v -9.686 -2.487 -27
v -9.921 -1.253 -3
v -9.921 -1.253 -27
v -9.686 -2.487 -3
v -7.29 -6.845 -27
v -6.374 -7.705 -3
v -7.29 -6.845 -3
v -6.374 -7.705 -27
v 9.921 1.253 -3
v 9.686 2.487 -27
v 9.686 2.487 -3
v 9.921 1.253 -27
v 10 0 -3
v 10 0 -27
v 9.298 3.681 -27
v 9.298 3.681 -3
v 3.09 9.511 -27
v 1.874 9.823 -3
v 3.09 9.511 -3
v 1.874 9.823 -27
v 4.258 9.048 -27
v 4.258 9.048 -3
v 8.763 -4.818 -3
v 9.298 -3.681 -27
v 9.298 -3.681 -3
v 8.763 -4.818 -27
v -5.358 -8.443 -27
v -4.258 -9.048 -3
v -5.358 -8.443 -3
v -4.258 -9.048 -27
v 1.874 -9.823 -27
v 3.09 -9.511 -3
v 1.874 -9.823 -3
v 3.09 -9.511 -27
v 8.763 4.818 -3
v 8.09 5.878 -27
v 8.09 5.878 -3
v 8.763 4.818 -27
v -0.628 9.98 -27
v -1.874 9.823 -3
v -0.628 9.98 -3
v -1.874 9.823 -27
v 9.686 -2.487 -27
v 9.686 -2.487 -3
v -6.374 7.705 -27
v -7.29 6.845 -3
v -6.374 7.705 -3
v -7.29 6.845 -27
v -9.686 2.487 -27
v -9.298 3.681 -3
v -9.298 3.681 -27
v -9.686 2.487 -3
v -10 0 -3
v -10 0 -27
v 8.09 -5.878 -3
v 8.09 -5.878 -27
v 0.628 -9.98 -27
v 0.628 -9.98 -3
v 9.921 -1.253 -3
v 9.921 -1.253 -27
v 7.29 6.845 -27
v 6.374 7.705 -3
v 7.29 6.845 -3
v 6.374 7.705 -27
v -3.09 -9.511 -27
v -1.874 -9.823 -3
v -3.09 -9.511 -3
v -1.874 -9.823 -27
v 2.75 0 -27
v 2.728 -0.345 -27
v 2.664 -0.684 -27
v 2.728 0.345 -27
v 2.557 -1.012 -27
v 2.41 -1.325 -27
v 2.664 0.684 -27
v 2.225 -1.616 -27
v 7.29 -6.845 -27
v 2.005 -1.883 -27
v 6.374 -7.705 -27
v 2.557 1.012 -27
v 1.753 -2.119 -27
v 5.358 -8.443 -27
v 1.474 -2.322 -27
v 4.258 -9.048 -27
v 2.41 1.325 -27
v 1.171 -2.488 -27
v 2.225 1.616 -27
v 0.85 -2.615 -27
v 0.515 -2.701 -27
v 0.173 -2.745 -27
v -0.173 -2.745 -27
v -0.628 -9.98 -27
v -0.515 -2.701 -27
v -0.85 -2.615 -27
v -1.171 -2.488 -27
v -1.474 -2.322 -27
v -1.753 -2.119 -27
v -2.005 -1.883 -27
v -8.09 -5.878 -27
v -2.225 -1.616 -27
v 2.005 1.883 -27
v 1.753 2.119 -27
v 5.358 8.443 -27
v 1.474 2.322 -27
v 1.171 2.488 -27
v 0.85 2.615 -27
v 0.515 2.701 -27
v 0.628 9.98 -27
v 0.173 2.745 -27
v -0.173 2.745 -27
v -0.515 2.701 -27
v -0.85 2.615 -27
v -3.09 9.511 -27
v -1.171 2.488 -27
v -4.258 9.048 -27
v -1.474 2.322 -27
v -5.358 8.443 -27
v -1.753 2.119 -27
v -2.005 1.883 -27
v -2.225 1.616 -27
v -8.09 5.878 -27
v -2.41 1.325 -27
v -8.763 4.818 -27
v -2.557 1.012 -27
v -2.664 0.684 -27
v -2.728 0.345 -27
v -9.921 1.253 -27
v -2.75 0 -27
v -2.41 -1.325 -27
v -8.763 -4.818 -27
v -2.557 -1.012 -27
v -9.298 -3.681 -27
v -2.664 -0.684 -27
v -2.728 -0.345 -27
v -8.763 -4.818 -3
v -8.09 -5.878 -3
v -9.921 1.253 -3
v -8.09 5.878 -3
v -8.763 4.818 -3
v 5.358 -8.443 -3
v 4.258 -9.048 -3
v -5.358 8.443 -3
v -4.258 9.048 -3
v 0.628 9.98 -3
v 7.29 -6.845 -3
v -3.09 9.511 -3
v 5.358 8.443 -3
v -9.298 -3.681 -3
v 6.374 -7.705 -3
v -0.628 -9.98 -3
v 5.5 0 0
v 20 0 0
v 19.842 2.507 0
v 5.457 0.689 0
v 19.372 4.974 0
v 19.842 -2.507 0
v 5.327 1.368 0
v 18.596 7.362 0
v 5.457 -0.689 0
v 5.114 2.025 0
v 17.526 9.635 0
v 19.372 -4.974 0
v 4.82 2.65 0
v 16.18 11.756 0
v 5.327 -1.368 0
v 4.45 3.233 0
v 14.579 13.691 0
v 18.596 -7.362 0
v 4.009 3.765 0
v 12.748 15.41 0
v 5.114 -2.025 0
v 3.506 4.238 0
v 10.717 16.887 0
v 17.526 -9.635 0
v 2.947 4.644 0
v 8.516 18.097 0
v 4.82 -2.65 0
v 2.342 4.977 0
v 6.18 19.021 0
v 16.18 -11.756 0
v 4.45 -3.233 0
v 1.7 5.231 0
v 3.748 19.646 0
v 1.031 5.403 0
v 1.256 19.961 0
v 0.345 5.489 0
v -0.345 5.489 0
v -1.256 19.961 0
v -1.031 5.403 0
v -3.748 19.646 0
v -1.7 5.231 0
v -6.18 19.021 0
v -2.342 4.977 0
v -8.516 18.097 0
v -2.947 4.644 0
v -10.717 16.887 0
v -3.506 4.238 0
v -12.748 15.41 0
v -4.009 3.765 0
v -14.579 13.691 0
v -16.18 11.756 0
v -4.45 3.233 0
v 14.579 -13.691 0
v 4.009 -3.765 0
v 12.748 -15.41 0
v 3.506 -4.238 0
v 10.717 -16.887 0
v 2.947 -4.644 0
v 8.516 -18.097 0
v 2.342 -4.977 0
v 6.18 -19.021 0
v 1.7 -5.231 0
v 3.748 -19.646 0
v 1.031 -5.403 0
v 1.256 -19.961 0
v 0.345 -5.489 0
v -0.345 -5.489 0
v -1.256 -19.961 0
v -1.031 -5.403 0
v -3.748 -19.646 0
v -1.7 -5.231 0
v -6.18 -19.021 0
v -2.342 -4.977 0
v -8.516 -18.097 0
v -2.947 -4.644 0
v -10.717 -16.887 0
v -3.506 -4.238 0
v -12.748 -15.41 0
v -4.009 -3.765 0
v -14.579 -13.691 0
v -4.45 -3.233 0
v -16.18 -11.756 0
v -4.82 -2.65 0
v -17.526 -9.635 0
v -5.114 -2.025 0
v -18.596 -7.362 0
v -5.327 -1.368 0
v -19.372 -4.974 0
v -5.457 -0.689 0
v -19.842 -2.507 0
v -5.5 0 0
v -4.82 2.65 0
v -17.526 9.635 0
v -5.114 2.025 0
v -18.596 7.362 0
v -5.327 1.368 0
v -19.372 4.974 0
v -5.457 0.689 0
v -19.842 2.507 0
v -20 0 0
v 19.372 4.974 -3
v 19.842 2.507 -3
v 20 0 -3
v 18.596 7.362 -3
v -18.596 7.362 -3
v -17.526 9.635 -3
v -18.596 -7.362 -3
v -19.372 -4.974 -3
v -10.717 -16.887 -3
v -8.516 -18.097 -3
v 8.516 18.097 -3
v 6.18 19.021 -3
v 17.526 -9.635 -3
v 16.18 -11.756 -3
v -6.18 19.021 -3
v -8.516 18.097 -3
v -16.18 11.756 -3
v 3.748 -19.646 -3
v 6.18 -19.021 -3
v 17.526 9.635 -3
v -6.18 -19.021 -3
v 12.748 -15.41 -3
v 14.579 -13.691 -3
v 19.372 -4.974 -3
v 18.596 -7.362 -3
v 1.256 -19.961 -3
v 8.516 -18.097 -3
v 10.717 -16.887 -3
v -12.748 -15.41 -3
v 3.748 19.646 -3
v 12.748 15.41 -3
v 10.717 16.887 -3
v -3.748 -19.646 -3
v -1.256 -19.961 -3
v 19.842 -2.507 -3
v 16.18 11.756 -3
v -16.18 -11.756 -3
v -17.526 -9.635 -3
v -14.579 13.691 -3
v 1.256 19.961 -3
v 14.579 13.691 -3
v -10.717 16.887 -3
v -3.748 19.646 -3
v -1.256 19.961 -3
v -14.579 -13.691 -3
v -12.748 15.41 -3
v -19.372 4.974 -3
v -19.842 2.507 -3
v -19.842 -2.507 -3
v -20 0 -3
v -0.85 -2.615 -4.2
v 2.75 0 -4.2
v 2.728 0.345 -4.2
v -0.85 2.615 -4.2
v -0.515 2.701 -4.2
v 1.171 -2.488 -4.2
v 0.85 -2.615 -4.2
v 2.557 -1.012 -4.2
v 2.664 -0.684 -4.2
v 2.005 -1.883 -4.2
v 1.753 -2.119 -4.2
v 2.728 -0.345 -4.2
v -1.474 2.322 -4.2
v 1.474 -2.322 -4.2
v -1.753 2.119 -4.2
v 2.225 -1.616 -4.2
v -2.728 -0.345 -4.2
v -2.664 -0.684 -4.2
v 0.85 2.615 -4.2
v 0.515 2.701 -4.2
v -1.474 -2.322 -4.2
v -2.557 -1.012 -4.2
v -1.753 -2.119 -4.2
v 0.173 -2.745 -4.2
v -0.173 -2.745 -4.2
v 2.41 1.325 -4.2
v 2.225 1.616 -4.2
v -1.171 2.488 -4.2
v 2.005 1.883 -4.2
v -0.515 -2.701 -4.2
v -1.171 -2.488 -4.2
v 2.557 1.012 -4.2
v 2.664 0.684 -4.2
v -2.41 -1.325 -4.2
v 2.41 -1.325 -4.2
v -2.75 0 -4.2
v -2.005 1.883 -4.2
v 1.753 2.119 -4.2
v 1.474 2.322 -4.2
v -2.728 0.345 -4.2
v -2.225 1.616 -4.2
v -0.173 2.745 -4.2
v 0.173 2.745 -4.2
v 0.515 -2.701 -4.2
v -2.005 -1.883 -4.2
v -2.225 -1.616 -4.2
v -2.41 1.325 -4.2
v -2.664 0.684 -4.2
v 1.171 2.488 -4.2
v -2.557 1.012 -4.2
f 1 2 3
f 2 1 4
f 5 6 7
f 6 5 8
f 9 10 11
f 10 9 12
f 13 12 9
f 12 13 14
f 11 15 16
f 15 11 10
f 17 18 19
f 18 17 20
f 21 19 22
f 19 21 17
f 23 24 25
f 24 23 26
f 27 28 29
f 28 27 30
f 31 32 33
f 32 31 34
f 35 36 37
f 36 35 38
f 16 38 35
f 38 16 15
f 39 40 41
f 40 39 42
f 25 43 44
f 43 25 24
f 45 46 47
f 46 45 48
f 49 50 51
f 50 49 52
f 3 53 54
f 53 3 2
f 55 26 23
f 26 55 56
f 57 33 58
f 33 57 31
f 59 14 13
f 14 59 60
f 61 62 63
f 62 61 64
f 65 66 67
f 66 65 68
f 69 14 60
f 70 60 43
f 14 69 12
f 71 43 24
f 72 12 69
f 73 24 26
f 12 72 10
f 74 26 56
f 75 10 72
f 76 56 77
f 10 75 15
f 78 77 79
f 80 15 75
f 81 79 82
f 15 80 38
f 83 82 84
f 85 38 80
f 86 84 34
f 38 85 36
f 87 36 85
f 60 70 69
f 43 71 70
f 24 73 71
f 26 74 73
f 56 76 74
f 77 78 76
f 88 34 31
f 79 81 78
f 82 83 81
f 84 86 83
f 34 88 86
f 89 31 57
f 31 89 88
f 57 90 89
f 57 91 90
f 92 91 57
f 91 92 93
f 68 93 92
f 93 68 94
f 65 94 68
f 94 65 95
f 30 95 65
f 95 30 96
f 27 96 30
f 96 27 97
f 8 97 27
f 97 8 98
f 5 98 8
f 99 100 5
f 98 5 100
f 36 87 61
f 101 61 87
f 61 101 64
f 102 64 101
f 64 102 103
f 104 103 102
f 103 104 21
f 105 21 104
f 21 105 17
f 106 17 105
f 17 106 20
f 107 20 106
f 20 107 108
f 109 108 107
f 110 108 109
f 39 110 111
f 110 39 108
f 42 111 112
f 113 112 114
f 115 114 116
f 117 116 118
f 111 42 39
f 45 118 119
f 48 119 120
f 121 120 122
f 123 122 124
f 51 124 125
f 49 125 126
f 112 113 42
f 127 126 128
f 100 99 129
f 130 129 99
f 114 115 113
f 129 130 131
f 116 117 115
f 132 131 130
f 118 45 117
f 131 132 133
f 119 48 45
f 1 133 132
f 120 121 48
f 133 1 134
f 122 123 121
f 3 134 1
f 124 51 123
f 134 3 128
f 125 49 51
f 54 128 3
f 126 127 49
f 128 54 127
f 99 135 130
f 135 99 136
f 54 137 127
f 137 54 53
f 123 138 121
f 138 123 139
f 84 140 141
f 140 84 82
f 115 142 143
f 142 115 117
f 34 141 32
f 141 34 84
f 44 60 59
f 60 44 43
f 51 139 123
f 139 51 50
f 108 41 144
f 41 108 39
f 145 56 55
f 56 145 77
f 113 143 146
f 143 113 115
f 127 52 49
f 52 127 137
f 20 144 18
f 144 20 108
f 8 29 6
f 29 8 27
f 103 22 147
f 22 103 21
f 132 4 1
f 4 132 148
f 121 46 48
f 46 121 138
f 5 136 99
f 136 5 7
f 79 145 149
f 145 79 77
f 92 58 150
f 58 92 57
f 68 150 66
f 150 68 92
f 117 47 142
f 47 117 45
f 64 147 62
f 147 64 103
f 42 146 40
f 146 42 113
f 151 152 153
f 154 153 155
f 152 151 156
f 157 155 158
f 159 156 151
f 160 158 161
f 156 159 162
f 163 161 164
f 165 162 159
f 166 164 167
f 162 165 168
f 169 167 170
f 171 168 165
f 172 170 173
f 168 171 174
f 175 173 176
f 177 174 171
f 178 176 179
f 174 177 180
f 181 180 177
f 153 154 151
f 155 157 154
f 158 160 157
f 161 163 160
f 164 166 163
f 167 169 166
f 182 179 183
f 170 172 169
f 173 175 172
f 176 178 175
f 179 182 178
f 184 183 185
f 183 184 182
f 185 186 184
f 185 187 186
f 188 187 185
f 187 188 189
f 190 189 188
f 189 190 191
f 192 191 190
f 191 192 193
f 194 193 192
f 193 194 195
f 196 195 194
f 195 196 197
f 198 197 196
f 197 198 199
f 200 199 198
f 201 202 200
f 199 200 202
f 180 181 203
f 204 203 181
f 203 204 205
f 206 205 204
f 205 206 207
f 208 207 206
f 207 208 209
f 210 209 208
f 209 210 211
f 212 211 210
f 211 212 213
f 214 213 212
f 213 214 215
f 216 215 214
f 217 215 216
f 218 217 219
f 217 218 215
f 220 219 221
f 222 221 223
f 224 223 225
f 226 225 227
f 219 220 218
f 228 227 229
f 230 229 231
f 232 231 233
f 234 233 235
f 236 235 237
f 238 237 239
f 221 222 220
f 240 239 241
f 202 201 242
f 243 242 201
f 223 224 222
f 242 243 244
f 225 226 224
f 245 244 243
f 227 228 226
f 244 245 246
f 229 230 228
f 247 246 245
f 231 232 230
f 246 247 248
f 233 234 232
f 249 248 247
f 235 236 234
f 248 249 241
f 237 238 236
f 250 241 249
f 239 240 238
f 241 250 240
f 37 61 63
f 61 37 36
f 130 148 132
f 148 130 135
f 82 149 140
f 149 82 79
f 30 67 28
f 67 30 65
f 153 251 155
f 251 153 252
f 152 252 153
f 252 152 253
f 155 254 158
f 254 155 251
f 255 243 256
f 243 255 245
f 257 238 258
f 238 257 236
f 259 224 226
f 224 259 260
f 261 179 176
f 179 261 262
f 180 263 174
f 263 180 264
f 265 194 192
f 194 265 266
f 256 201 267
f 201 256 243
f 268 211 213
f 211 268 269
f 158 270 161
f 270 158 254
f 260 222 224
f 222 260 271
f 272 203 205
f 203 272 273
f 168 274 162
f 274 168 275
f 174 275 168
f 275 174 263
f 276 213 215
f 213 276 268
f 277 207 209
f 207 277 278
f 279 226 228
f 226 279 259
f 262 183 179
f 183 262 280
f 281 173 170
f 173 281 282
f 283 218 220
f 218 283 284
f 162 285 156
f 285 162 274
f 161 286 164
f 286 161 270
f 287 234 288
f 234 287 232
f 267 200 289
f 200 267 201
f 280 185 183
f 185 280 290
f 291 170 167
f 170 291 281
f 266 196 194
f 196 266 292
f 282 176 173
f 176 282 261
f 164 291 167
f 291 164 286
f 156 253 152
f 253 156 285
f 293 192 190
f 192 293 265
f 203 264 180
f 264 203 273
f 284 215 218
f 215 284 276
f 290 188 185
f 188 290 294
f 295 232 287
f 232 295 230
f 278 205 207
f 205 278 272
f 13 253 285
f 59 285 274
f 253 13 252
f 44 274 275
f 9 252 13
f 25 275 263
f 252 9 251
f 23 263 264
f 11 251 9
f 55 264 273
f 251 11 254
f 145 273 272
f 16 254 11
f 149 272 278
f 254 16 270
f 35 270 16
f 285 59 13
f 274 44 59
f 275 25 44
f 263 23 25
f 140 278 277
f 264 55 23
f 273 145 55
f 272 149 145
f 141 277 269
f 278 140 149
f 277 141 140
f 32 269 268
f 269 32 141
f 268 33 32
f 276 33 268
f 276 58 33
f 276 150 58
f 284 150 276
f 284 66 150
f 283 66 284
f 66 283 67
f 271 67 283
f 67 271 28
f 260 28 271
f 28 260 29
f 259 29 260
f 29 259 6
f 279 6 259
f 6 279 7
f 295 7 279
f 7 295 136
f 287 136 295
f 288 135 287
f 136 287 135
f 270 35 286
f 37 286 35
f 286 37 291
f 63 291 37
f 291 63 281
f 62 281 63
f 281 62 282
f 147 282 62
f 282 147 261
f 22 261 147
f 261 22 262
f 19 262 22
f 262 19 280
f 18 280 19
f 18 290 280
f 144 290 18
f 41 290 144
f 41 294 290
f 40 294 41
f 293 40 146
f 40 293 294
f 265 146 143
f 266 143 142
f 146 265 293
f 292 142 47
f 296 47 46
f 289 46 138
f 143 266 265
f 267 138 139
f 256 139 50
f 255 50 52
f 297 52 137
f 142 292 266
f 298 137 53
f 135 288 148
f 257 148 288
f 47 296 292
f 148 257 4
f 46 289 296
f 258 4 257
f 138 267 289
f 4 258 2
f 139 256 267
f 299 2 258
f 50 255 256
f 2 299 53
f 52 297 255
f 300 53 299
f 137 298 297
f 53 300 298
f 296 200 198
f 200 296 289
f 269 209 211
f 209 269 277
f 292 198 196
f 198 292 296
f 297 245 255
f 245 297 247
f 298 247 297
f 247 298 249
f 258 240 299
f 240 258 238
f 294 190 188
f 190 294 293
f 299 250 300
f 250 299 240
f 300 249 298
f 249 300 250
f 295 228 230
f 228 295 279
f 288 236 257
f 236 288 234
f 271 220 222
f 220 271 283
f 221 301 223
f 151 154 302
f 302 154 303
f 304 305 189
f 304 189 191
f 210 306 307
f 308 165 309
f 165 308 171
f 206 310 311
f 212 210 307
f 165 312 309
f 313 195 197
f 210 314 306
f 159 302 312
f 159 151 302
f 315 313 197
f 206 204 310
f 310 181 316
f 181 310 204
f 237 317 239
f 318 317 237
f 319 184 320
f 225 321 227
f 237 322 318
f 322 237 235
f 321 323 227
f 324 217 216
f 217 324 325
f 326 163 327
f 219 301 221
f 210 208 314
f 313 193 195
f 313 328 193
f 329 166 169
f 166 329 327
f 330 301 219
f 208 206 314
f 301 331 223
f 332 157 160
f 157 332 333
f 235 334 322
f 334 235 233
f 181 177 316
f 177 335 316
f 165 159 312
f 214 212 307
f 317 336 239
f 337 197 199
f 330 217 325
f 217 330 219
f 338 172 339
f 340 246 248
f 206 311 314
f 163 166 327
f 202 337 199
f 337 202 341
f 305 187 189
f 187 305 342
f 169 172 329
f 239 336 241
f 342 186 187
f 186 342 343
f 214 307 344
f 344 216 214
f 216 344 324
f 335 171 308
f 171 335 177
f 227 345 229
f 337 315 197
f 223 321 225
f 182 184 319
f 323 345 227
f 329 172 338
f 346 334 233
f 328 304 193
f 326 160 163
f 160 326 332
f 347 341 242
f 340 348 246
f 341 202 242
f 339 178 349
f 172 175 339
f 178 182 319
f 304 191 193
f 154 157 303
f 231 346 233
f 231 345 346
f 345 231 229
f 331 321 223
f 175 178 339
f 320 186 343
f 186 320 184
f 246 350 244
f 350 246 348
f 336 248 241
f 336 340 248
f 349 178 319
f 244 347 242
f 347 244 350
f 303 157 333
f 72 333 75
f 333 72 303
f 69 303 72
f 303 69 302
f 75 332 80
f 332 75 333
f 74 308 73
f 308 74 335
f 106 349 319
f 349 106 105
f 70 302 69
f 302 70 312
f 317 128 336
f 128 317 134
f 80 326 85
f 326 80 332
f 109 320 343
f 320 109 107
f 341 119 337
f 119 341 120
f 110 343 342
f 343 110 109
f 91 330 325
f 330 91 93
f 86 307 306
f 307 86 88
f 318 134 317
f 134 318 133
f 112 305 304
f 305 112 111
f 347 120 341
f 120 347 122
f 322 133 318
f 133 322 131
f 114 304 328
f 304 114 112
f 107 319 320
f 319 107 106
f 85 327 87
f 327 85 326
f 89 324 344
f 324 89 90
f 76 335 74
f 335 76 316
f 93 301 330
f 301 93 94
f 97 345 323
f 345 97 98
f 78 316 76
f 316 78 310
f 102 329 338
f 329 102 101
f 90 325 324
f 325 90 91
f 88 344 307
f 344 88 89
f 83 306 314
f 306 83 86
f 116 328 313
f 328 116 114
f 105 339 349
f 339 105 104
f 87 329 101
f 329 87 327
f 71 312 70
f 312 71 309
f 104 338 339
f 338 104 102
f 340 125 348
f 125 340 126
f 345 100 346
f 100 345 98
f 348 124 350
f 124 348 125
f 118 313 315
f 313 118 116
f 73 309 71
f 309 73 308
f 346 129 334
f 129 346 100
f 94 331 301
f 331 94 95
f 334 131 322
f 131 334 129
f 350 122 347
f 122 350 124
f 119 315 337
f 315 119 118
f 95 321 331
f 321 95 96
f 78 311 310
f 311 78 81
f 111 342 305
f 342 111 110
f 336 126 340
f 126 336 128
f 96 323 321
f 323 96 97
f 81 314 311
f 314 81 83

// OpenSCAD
$fn = 50;


difference() {
	union() {
		translate(v = [0, 0, -27.0000000000]) {
			cylinder(h = 27, r = 10.0000000000);
		}
		translate(v = [0, 0, -3.0000000000]) {
			cylinder(h = 3, r = 20.0000000000);
		}
	}
	union() {
		translate(v = [0, 0, 0]) {
			rotate(a = [0, 0, 0]) {
				difference() {
					union() {
						#translate(v = [0, 0, -27.0000000000]) {
							cylinder(h = 27, r = 2.2500000000);
						}
						#translate(v = [0, 0, -4.2000000000]) {
							cylinder(h = 4.2000000000, r1 = 2.7500000000, r2 = 5.5000000000);
						}
						#translate(v = [0, 0, -27.0000000000]) {
							cylinder(h = 27, r = 2.7500000000);
						}
						#translate(v = [0, 0, -27.0000000000]) {
							cylinder(h = 27, r = 2.2500000000);
						}
					}
					union();
				}
			}
		}
	}
}
